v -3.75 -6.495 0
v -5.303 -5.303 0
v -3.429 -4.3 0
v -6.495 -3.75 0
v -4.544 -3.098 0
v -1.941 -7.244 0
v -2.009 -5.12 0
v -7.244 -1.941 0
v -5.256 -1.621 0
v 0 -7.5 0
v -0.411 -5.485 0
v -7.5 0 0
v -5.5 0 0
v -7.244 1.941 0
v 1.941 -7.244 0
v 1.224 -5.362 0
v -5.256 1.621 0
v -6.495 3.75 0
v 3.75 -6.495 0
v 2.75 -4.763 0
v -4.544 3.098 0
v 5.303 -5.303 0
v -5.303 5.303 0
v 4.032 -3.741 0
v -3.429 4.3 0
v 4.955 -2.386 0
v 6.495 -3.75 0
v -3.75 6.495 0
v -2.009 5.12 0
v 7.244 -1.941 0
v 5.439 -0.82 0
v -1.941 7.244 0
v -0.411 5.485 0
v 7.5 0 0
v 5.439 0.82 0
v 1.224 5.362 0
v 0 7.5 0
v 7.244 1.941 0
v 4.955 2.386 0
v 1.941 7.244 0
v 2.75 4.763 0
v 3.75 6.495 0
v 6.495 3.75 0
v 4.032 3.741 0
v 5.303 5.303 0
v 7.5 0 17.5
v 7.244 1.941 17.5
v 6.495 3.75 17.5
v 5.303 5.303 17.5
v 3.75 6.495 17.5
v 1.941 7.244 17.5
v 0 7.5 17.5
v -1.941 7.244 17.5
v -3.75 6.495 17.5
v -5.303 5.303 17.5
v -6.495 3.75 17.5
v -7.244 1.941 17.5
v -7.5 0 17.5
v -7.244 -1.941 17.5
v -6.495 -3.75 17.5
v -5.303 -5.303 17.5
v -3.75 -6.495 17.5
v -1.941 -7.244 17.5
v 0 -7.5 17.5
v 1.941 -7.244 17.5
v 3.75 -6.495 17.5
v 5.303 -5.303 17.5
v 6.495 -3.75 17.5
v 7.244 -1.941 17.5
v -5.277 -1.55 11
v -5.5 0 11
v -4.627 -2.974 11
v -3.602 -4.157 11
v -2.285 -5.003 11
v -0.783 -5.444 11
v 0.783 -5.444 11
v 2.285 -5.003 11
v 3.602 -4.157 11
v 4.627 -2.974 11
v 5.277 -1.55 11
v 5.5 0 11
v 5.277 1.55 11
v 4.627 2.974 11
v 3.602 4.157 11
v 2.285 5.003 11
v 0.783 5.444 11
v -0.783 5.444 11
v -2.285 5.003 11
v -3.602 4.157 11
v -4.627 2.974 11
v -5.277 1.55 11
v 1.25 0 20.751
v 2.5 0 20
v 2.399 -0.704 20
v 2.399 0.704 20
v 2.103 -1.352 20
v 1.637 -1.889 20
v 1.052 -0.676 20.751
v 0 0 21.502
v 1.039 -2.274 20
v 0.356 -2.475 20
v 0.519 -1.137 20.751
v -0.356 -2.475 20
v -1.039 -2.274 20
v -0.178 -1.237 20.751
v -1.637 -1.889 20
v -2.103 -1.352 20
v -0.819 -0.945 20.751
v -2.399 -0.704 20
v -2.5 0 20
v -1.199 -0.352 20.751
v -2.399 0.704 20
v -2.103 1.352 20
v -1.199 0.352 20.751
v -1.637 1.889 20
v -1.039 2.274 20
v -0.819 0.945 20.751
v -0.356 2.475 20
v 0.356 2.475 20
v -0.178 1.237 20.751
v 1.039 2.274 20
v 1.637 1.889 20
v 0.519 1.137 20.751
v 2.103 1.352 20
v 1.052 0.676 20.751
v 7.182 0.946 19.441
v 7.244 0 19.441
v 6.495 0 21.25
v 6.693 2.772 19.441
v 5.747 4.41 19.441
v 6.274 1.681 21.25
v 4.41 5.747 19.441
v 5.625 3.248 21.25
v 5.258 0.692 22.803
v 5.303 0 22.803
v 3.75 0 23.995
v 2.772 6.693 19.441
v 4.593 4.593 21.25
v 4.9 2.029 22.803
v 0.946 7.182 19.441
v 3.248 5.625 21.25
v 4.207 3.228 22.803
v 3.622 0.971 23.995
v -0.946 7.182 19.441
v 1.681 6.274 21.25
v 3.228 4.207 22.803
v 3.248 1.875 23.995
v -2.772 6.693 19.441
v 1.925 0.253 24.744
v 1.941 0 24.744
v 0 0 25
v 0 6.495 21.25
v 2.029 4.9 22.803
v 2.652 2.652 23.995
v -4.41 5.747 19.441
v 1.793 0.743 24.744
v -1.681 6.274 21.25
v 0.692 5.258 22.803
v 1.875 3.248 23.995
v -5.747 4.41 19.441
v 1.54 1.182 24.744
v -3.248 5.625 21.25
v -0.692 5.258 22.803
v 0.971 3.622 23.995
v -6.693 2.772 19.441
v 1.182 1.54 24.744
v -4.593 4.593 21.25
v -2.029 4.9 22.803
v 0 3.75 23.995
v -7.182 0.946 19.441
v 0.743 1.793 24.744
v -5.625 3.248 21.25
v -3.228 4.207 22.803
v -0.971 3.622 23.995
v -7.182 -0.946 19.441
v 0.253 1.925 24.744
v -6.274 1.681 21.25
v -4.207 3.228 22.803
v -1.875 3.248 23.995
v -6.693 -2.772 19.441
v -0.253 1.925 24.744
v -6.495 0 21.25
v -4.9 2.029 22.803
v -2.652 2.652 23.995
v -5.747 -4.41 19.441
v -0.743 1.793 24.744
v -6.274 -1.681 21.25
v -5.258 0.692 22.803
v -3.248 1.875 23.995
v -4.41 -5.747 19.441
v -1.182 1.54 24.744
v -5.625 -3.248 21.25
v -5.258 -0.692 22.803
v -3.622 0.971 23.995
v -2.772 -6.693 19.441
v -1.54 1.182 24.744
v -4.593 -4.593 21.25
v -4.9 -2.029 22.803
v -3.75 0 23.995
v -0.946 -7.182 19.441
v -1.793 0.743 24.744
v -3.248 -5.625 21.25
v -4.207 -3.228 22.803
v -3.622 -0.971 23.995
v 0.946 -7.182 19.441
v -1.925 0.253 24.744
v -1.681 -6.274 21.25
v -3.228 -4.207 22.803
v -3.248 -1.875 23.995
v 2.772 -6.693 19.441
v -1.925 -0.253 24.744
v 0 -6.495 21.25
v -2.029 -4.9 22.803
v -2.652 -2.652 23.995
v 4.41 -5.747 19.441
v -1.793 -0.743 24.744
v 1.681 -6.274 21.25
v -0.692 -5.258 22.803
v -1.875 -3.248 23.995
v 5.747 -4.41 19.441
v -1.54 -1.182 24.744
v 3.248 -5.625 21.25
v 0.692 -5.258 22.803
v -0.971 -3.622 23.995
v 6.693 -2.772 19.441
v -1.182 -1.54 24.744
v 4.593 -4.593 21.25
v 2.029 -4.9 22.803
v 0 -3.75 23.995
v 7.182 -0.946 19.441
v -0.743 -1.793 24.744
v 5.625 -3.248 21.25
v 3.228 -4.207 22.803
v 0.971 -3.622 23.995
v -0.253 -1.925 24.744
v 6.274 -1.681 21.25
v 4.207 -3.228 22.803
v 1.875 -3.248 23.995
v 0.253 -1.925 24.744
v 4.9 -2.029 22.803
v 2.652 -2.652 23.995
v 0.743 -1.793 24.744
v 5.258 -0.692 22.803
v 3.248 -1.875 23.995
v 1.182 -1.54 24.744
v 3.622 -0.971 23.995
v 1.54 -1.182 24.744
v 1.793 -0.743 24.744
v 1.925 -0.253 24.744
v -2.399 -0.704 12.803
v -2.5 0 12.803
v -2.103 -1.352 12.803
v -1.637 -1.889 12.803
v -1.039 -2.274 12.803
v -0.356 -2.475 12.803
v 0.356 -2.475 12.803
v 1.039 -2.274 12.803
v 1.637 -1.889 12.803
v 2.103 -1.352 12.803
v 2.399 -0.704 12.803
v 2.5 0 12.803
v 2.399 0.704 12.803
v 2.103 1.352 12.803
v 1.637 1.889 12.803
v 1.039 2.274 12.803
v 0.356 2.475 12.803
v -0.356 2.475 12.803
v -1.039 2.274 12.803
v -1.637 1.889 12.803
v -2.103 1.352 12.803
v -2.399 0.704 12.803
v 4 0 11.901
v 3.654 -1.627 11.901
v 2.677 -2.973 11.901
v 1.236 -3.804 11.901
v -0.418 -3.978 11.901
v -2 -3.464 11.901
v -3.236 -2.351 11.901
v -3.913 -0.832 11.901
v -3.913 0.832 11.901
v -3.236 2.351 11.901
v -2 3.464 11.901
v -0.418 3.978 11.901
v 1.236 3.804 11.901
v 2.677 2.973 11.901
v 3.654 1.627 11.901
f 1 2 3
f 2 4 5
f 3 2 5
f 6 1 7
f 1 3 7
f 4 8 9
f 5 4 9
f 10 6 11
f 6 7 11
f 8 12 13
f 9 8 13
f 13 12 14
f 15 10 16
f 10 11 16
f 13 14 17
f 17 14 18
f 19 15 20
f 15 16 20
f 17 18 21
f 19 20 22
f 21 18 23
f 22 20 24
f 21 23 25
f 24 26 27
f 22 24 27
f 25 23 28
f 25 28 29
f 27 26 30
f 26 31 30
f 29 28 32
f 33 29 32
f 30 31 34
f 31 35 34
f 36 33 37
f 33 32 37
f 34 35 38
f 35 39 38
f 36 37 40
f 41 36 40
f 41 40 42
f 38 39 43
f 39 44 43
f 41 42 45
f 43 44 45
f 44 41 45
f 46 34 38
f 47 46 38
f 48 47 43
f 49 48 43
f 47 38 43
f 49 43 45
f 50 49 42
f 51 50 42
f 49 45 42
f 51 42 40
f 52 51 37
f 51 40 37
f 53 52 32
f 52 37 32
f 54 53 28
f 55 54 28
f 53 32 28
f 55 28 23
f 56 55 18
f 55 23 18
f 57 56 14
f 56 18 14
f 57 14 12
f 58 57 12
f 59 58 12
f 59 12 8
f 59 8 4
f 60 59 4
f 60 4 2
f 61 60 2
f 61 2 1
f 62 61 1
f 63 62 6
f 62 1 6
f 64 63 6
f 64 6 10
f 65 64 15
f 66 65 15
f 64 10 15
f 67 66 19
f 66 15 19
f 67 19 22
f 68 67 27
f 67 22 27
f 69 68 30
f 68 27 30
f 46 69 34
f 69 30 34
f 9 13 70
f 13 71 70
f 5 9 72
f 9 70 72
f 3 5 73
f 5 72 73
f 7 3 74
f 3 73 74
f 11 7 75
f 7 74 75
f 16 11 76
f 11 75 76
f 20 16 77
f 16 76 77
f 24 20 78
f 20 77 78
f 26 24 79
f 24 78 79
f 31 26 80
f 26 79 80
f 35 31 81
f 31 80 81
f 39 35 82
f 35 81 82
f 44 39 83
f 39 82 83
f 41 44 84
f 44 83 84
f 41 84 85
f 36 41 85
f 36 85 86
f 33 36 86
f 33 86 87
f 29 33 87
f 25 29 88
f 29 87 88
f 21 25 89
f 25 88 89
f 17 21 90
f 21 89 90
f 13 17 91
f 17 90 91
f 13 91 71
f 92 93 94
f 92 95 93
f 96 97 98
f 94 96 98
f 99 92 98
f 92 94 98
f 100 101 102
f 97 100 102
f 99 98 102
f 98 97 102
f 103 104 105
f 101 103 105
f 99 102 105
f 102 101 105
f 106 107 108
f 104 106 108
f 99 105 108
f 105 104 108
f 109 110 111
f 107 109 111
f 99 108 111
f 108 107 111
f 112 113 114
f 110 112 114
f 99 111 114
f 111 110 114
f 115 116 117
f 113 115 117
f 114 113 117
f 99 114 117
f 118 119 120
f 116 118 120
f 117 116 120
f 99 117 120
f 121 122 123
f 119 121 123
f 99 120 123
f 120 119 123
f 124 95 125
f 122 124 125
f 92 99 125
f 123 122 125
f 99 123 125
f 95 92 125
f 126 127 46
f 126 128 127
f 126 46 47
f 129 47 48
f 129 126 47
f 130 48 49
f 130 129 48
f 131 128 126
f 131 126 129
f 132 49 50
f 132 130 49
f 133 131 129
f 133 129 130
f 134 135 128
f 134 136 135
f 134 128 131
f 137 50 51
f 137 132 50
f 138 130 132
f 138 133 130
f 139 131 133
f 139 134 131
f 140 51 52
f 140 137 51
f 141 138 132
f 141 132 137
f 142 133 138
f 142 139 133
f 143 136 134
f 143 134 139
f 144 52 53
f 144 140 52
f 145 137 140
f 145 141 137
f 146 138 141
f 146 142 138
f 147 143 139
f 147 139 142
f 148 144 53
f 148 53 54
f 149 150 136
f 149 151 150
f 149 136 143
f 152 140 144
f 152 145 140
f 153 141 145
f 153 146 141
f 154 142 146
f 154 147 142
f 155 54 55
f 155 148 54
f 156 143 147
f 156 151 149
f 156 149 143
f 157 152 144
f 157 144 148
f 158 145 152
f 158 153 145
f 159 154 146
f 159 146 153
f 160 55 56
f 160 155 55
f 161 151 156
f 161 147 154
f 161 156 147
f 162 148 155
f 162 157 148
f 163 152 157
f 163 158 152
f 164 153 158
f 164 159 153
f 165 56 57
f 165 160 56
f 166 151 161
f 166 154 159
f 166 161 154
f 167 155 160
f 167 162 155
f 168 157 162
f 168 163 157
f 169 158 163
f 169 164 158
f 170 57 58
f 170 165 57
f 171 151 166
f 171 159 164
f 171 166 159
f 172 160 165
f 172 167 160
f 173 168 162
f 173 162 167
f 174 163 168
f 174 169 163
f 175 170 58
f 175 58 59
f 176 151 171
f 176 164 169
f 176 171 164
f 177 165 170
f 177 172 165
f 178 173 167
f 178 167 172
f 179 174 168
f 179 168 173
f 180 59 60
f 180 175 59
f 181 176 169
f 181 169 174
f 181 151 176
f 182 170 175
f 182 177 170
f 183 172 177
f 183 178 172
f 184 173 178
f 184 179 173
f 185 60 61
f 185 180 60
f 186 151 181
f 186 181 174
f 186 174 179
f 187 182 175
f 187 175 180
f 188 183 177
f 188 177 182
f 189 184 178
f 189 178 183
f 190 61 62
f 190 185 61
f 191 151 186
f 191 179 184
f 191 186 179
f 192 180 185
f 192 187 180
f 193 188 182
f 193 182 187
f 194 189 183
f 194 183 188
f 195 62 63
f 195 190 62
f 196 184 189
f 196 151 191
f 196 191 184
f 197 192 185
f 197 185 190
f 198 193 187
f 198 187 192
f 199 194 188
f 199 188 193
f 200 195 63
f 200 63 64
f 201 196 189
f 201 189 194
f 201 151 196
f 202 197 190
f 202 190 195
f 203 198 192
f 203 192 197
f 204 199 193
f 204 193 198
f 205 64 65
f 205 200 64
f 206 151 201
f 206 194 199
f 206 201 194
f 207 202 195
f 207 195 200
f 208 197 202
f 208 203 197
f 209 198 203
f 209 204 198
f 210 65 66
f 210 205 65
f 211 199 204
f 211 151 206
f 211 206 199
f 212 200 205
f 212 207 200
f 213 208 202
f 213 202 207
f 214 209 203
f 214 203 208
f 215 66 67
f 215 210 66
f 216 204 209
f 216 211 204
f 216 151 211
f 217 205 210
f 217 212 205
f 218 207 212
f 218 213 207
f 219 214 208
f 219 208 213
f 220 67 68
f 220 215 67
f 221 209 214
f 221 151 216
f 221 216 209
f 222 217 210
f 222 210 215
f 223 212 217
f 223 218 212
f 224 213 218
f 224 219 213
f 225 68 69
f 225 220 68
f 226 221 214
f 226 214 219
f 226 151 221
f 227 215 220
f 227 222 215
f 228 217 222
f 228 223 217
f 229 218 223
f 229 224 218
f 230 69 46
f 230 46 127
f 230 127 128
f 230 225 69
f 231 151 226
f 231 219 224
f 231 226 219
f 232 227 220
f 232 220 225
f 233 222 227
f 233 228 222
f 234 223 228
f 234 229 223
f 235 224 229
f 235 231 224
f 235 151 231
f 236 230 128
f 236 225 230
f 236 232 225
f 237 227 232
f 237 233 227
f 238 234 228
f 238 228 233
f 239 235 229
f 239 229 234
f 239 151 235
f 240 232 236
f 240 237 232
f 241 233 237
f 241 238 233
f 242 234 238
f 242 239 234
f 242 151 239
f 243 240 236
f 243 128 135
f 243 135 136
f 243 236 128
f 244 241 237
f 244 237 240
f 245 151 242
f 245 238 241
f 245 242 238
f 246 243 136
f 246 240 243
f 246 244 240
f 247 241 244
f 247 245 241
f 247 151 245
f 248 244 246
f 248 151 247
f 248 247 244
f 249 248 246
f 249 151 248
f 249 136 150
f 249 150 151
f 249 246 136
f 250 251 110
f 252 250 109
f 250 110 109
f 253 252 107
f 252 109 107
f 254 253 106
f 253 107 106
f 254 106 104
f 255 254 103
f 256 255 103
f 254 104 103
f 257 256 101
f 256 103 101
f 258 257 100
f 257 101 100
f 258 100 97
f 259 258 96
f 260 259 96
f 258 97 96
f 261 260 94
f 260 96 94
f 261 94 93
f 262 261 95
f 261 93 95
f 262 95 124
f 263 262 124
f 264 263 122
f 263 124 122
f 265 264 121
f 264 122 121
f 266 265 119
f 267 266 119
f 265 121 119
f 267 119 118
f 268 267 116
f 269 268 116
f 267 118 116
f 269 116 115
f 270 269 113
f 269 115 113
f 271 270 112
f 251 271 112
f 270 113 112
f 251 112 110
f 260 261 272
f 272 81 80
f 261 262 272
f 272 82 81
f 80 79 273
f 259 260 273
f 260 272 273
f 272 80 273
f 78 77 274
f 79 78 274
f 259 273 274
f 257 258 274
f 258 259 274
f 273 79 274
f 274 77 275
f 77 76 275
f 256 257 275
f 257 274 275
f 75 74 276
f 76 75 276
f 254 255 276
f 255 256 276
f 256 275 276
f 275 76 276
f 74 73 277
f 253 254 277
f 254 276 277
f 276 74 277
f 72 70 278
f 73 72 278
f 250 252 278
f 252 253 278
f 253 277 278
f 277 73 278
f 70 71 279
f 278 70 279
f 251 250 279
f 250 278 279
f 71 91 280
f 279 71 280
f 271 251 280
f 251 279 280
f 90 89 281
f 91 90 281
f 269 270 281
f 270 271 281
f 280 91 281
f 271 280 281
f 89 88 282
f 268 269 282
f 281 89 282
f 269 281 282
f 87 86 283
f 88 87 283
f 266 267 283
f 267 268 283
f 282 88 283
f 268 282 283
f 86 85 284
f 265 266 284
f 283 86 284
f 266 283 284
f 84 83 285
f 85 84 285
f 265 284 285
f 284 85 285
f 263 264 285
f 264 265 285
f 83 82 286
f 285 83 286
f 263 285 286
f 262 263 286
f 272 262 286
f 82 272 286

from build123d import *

# Parameters (mm, degrees)
F0_R     = 7.5
F1_DEPTH = 25
F3_D     = 5
F3_DEPTH = 20
F3_TIP   = 1.5021515476
F5_D     = 11
F5_DEPTH = 11
F5_TIP   = 3.3047334047
F6_R     = 7.5


with BuildPart() as f1:
    # F0 (on Top) → F1 (new body)
    with BuildSketch(Plane.XY):
        Circle(F0_R)
    extrude(amount=F1_DEPTH)

    # F3
    with Locations(Plane(origin=(0, 0, 0), x_dir=(1, 0, 0), z_dir=(0, 0, -1))):
        with Locations((0, 0)):
            Hole(F3_D / 2, depth=F3_DEPTH)
            with Locations((0, 0, -(F3_DEPTH + F3_TIP / 2))):  # 118° drill point
                Cone(0, F3_D / 2, F3_TIP, mode=Mode.SUBTRACT)

    # F5
    with Locations(Plane(origin=(0, 0, 0), x_dir=(1, 0, 0), z_dir=(0, 0, -1))):
        with Locations((0, 0)):
            Hole(F5_D / 2, depth=F5_DEPTH)
            with Locations((0, 0, -(F5_DEPTH + F5_TIP / 2))):  # 118° drill point
                Cone(0, F5_D / 2, F5_TIP, mode=Mode.SUBTRACT)

    # F6
    f6_edges = [f1.edges().sort_by_distance(p)[0] for p in [
        (-7.5, 0, 25),
    ]]
    fillet(f6_edges, radius=F6_R)


solid = f1.part
